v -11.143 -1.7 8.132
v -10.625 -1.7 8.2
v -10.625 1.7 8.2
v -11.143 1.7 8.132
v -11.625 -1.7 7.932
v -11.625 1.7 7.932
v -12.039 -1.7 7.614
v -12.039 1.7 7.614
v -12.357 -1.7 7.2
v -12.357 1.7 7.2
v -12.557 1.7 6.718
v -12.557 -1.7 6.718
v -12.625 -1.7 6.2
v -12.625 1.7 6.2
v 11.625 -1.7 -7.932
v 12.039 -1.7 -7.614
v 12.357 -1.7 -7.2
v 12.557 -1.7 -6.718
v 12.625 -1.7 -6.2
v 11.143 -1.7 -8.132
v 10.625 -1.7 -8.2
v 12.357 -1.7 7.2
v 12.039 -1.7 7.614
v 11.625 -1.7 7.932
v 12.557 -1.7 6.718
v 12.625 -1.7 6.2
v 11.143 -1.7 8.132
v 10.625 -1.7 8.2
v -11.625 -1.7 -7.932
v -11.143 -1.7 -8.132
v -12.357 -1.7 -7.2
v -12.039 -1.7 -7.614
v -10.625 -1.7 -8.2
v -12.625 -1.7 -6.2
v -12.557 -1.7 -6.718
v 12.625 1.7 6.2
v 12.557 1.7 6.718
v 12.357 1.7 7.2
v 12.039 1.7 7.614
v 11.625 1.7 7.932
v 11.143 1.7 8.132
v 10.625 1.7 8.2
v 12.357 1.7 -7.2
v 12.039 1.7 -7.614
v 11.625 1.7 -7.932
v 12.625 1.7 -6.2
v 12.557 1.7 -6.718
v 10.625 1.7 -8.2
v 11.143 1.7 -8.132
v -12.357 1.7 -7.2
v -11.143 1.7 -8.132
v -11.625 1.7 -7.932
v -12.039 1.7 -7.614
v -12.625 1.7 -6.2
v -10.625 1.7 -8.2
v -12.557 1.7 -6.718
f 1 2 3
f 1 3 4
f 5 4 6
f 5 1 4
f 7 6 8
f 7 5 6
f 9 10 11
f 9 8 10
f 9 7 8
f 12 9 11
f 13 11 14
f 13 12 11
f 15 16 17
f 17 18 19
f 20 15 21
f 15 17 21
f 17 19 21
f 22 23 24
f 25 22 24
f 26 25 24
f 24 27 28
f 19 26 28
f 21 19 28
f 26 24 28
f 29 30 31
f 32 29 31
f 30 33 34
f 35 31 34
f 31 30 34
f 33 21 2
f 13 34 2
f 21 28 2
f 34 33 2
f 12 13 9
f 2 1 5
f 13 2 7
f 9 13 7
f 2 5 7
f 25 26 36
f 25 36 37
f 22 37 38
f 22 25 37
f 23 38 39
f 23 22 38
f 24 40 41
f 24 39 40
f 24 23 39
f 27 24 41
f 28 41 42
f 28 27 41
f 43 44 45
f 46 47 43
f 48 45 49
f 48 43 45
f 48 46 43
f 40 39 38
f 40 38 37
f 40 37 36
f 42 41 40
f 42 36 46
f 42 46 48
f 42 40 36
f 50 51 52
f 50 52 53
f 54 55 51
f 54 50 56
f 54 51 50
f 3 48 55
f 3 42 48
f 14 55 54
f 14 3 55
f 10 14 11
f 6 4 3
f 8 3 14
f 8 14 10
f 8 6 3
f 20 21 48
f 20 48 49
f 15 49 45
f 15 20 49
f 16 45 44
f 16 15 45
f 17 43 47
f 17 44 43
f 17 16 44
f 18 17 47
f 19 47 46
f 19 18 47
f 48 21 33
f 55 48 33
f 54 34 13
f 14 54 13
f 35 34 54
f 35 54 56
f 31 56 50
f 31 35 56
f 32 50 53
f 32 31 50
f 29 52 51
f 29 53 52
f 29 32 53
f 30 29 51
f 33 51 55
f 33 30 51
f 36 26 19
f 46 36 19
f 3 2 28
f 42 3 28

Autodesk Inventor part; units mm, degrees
ref_plane "YZ Plane" through (0, 0, 0) normal (1, 0, 0) x (0, 1, 0)
ref_plane "XZ Plane" through (0, 0, 0) normal (0, 1, 0) x (-1, 0, 0)
ref_plane "XY Plane" through (0, 0, 0) normal (0, 0, 1) x (1, 0, 0)
sketch "Sketch1" plane through (0, 0, 0) normal (0, 1, 0) x (-1, 0, 0)
  line L0 (10.625, 8.2) -> (-10.625, 8.2)
  line L1 (-12.625, 6.2) -> (-12.625, -6.2)
  line L2 (-10.625, -8.2) -> (10.625, -8.2)
  line L3 (12.625, -6.2) -> (12.625, 6.2)
  line L4 (12.625, 8.2) -> (-12.625, -8.2) construction
  line L5 (-12.625, 8.2) -> (12.625, -8.2) construction
  arc A0 (12.625, 6.2) -> (10.625, 8.2) centre (10.625, 6.2) ccw
  arc A1 (10.625, -8.2) -> (12.625, -6.2) centre (10.625, -6.2) ccw
  arc A2 (-12.625, -6.2) -> (-10.625, -8.2) centre (-10.625, -6.2) ccw
  arc A3 (-10.625, 8.2) -> (-12.625, 6.2) centre (-10.625, 6.2) ccw
  point P0 (0, 0)
  dimension "d0" = 25.25
  dimension "d1" = 16.4
  dimension "d4" = 2
extrude "Extrusion1" add sketch "Sketch1" along normal mid plane 3.4
equation "\"d0\" = NekroWidth"
equation "\"d1\" = NekroLength"
equation "\"NekroWidth\" = 25.25"
equation "\"NekroLength\" = 16.4"
properties part number "FactionSpecial_Nekro_XY" material "Paper"
